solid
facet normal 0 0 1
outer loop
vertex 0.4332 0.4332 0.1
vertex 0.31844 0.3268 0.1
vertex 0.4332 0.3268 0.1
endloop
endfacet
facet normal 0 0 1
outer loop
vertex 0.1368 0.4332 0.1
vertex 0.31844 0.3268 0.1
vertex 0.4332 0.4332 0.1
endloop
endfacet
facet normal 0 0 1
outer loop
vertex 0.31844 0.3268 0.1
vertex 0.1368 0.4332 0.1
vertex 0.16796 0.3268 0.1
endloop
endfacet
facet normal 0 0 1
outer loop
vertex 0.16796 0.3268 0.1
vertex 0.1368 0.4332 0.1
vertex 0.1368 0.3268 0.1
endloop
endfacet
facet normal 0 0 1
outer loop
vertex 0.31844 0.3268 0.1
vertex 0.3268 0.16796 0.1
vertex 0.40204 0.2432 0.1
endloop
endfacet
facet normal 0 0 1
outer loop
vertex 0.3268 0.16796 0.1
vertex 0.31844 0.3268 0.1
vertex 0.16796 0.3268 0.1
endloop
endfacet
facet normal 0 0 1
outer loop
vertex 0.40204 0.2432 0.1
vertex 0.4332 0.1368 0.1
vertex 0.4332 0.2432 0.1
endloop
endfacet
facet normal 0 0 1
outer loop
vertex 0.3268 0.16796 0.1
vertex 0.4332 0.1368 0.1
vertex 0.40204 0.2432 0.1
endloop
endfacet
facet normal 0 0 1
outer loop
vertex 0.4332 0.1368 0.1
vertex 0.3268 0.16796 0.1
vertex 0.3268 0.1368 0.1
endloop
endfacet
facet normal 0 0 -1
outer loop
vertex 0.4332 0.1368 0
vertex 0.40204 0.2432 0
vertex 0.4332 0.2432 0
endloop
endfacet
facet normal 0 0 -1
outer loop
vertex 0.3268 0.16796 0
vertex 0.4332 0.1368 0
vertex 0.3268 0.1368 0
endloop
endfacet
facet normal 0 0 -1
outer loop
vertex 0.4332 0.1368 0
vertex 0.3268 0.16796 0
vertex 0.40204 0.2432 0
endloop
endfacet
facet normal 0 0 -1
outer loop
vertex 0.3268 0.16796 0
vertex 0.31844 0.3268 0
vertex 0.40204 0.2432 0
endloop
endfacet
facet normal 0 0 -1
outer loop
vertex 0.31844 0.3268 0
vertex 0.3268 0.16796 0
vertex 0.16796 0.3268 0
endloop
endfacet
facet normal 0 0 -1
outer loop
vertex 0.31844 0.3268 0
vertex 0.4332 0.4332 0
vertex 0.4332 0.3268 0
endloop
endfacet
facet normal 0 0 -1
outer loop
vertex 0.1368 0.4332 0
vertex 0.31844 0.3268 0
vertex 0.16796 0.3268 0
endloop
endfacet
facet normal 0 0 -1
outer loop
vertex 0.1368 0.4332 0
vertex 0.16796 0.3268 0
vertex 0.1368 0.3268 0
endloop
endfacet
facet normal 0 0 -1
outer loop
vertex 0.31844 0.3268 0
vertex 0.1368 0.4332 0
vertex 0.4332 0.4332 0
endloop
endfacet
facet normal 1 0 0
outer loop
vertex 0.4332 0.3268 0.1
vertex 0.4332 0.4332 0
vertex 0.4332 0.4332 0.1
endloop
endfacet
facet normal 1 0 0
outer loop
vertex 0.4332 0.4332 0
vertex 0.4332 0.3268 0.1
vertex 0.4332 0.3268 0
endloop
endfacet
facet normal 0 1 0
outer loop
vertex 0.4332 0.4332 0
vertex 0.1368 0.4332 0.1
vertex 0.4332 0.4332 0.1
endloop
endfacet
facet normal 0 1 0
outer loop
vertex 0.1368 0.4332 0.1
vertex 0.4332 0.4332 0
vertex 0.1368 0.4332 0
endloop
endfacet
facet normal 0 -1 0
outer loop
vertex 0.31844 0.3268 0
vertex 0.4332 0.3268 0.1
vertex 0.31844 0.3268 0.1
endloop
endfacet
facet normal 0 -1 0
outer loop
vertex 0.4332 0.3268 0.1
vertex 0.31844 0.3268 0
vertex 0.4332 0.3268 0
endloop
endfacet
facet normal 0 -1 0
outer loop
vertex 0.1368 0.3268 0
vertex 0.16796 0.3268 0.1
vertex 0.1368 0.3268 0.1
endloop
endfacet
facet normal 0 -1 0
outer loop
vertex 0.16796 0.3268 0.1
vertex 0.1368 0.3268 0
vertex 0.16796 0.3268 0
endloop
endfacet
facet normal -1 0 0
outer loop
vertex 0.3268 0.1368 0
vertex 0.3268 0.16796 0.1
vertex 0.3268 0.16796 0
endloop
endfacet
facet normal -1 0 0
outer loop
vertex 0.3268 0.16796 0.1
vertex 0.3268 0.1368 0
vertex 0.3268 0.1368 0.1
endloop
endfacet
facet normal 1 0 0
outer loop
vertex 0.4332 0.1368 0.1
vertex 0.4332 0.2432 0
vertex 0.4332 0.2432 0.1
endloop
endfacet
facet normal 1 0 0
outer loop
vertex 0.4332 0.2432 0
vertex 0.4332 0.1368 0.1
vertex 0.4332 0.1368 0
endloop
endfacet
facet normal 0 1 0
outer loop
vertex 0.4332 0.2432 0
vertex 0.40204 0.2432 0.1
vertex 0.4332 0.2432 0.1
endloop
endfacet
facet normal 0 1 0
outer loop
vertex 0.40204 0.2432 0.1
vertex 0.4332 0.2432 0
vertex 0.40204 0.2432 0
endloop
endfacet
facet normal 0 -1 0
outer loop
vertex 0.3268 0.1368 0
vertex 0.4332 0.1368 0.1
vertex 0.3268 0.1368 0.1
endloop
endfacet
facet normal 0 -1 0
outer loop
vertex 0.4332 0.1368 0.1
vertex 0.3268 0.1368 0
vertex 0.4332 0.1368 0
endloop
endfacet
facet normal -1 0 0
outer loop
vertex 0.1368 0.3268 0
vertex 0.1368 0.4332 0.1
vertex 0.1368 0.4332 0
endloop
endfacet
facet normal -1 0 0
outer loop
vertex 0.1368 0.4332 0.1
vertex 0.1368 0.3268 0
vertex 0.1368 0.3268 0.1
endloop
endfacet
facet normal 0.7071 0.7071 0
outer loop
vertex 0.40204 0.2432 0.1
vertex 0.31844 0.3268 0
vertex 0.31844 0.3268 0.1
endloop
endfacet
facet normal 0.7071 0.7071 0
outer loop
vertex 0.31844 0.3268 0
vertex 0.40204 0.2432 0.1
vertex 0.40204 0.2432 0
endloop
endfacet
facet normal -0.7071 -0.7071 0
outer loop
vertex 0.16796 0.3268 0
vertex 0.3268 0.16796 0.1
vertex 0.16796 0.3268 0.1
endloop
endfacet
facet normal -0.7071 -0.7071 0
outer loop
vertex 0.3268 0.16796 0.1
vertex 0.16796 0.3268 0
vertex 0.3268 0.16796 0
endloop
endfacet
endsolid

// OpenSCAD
use <../../../scad_include/routing.scad>

px = 7.6e-3;
layer = 10e-3;

module junction_25px_0(xpos, ypos, zpos, orientation){
      
    // Channel Dimensions
    hchan = 10*layer;
    Wchan = 14*px;

    dim  = [
            [[0,0],[-Wchan/2,Wchan/2],[0,hchan]], // 0
            [[-Wchan/2,Wchan/2],[0,0],[0,hchan]], // 1

           ];

    module obj(){
        pi_0 = [-7*px, 25*px, 0];
        pf_0 = [Wchan+11*px, 0, 0];
        connect_0 = [
                     ["+x", pf_0, 0]
                    ];
        routing(pi_0, connect_0, dim);

        pi_1 = [-7*px, 0*px, 0];
        pf_1 = [Wchan, 0, 0];
        connect_1 = [
                     ["+x", pf_1, 0]
                    ];
        routing(pi_1, connect_1, dim);

        pi_2 = [18*px, 25*px, 0];
        pf_2 = [Wchan, 0, 0];
        connect_2 = [
                     ["+x", pf_2, 0]
                    ];
        routing(pi_2, connect_2, dim);

        pi_3 = [0, 0, 0];
        pf_3 = [35.4*px, 0, 0];
        connect_3 = [
                     ["+x", pf_3, 0]
                    ];
        rotate(45)
        routing(pi_3, connect_3, dim);  
        
    }
    
    if (orientation == "FN"){
        translate([25*px + xpos*px, 25*px + ypos*px, zpos*layer])
        obj();
    }
    if (orientation == "N"){
        mirror()
        translate([-2*25*px - xpos*px, 25*px + ypos*px, zpos*layer])
        obj();
    }
    if (orientation == "S"){
        mirror([0, 1, 0])
        translate([25*px + xpos*px, -2*25*px - ypos*px, zpos*layer])
        obj();
    }
    if (orientation == "FS"){
        mirror()
        mirror([0, 1, 0])
        translate([-2*25*px - xpos*px, -2*25*px - ypos*px, zpos*layer])
        obj();
    }
    
}

junction_25px_0(0,0,0,"N");
